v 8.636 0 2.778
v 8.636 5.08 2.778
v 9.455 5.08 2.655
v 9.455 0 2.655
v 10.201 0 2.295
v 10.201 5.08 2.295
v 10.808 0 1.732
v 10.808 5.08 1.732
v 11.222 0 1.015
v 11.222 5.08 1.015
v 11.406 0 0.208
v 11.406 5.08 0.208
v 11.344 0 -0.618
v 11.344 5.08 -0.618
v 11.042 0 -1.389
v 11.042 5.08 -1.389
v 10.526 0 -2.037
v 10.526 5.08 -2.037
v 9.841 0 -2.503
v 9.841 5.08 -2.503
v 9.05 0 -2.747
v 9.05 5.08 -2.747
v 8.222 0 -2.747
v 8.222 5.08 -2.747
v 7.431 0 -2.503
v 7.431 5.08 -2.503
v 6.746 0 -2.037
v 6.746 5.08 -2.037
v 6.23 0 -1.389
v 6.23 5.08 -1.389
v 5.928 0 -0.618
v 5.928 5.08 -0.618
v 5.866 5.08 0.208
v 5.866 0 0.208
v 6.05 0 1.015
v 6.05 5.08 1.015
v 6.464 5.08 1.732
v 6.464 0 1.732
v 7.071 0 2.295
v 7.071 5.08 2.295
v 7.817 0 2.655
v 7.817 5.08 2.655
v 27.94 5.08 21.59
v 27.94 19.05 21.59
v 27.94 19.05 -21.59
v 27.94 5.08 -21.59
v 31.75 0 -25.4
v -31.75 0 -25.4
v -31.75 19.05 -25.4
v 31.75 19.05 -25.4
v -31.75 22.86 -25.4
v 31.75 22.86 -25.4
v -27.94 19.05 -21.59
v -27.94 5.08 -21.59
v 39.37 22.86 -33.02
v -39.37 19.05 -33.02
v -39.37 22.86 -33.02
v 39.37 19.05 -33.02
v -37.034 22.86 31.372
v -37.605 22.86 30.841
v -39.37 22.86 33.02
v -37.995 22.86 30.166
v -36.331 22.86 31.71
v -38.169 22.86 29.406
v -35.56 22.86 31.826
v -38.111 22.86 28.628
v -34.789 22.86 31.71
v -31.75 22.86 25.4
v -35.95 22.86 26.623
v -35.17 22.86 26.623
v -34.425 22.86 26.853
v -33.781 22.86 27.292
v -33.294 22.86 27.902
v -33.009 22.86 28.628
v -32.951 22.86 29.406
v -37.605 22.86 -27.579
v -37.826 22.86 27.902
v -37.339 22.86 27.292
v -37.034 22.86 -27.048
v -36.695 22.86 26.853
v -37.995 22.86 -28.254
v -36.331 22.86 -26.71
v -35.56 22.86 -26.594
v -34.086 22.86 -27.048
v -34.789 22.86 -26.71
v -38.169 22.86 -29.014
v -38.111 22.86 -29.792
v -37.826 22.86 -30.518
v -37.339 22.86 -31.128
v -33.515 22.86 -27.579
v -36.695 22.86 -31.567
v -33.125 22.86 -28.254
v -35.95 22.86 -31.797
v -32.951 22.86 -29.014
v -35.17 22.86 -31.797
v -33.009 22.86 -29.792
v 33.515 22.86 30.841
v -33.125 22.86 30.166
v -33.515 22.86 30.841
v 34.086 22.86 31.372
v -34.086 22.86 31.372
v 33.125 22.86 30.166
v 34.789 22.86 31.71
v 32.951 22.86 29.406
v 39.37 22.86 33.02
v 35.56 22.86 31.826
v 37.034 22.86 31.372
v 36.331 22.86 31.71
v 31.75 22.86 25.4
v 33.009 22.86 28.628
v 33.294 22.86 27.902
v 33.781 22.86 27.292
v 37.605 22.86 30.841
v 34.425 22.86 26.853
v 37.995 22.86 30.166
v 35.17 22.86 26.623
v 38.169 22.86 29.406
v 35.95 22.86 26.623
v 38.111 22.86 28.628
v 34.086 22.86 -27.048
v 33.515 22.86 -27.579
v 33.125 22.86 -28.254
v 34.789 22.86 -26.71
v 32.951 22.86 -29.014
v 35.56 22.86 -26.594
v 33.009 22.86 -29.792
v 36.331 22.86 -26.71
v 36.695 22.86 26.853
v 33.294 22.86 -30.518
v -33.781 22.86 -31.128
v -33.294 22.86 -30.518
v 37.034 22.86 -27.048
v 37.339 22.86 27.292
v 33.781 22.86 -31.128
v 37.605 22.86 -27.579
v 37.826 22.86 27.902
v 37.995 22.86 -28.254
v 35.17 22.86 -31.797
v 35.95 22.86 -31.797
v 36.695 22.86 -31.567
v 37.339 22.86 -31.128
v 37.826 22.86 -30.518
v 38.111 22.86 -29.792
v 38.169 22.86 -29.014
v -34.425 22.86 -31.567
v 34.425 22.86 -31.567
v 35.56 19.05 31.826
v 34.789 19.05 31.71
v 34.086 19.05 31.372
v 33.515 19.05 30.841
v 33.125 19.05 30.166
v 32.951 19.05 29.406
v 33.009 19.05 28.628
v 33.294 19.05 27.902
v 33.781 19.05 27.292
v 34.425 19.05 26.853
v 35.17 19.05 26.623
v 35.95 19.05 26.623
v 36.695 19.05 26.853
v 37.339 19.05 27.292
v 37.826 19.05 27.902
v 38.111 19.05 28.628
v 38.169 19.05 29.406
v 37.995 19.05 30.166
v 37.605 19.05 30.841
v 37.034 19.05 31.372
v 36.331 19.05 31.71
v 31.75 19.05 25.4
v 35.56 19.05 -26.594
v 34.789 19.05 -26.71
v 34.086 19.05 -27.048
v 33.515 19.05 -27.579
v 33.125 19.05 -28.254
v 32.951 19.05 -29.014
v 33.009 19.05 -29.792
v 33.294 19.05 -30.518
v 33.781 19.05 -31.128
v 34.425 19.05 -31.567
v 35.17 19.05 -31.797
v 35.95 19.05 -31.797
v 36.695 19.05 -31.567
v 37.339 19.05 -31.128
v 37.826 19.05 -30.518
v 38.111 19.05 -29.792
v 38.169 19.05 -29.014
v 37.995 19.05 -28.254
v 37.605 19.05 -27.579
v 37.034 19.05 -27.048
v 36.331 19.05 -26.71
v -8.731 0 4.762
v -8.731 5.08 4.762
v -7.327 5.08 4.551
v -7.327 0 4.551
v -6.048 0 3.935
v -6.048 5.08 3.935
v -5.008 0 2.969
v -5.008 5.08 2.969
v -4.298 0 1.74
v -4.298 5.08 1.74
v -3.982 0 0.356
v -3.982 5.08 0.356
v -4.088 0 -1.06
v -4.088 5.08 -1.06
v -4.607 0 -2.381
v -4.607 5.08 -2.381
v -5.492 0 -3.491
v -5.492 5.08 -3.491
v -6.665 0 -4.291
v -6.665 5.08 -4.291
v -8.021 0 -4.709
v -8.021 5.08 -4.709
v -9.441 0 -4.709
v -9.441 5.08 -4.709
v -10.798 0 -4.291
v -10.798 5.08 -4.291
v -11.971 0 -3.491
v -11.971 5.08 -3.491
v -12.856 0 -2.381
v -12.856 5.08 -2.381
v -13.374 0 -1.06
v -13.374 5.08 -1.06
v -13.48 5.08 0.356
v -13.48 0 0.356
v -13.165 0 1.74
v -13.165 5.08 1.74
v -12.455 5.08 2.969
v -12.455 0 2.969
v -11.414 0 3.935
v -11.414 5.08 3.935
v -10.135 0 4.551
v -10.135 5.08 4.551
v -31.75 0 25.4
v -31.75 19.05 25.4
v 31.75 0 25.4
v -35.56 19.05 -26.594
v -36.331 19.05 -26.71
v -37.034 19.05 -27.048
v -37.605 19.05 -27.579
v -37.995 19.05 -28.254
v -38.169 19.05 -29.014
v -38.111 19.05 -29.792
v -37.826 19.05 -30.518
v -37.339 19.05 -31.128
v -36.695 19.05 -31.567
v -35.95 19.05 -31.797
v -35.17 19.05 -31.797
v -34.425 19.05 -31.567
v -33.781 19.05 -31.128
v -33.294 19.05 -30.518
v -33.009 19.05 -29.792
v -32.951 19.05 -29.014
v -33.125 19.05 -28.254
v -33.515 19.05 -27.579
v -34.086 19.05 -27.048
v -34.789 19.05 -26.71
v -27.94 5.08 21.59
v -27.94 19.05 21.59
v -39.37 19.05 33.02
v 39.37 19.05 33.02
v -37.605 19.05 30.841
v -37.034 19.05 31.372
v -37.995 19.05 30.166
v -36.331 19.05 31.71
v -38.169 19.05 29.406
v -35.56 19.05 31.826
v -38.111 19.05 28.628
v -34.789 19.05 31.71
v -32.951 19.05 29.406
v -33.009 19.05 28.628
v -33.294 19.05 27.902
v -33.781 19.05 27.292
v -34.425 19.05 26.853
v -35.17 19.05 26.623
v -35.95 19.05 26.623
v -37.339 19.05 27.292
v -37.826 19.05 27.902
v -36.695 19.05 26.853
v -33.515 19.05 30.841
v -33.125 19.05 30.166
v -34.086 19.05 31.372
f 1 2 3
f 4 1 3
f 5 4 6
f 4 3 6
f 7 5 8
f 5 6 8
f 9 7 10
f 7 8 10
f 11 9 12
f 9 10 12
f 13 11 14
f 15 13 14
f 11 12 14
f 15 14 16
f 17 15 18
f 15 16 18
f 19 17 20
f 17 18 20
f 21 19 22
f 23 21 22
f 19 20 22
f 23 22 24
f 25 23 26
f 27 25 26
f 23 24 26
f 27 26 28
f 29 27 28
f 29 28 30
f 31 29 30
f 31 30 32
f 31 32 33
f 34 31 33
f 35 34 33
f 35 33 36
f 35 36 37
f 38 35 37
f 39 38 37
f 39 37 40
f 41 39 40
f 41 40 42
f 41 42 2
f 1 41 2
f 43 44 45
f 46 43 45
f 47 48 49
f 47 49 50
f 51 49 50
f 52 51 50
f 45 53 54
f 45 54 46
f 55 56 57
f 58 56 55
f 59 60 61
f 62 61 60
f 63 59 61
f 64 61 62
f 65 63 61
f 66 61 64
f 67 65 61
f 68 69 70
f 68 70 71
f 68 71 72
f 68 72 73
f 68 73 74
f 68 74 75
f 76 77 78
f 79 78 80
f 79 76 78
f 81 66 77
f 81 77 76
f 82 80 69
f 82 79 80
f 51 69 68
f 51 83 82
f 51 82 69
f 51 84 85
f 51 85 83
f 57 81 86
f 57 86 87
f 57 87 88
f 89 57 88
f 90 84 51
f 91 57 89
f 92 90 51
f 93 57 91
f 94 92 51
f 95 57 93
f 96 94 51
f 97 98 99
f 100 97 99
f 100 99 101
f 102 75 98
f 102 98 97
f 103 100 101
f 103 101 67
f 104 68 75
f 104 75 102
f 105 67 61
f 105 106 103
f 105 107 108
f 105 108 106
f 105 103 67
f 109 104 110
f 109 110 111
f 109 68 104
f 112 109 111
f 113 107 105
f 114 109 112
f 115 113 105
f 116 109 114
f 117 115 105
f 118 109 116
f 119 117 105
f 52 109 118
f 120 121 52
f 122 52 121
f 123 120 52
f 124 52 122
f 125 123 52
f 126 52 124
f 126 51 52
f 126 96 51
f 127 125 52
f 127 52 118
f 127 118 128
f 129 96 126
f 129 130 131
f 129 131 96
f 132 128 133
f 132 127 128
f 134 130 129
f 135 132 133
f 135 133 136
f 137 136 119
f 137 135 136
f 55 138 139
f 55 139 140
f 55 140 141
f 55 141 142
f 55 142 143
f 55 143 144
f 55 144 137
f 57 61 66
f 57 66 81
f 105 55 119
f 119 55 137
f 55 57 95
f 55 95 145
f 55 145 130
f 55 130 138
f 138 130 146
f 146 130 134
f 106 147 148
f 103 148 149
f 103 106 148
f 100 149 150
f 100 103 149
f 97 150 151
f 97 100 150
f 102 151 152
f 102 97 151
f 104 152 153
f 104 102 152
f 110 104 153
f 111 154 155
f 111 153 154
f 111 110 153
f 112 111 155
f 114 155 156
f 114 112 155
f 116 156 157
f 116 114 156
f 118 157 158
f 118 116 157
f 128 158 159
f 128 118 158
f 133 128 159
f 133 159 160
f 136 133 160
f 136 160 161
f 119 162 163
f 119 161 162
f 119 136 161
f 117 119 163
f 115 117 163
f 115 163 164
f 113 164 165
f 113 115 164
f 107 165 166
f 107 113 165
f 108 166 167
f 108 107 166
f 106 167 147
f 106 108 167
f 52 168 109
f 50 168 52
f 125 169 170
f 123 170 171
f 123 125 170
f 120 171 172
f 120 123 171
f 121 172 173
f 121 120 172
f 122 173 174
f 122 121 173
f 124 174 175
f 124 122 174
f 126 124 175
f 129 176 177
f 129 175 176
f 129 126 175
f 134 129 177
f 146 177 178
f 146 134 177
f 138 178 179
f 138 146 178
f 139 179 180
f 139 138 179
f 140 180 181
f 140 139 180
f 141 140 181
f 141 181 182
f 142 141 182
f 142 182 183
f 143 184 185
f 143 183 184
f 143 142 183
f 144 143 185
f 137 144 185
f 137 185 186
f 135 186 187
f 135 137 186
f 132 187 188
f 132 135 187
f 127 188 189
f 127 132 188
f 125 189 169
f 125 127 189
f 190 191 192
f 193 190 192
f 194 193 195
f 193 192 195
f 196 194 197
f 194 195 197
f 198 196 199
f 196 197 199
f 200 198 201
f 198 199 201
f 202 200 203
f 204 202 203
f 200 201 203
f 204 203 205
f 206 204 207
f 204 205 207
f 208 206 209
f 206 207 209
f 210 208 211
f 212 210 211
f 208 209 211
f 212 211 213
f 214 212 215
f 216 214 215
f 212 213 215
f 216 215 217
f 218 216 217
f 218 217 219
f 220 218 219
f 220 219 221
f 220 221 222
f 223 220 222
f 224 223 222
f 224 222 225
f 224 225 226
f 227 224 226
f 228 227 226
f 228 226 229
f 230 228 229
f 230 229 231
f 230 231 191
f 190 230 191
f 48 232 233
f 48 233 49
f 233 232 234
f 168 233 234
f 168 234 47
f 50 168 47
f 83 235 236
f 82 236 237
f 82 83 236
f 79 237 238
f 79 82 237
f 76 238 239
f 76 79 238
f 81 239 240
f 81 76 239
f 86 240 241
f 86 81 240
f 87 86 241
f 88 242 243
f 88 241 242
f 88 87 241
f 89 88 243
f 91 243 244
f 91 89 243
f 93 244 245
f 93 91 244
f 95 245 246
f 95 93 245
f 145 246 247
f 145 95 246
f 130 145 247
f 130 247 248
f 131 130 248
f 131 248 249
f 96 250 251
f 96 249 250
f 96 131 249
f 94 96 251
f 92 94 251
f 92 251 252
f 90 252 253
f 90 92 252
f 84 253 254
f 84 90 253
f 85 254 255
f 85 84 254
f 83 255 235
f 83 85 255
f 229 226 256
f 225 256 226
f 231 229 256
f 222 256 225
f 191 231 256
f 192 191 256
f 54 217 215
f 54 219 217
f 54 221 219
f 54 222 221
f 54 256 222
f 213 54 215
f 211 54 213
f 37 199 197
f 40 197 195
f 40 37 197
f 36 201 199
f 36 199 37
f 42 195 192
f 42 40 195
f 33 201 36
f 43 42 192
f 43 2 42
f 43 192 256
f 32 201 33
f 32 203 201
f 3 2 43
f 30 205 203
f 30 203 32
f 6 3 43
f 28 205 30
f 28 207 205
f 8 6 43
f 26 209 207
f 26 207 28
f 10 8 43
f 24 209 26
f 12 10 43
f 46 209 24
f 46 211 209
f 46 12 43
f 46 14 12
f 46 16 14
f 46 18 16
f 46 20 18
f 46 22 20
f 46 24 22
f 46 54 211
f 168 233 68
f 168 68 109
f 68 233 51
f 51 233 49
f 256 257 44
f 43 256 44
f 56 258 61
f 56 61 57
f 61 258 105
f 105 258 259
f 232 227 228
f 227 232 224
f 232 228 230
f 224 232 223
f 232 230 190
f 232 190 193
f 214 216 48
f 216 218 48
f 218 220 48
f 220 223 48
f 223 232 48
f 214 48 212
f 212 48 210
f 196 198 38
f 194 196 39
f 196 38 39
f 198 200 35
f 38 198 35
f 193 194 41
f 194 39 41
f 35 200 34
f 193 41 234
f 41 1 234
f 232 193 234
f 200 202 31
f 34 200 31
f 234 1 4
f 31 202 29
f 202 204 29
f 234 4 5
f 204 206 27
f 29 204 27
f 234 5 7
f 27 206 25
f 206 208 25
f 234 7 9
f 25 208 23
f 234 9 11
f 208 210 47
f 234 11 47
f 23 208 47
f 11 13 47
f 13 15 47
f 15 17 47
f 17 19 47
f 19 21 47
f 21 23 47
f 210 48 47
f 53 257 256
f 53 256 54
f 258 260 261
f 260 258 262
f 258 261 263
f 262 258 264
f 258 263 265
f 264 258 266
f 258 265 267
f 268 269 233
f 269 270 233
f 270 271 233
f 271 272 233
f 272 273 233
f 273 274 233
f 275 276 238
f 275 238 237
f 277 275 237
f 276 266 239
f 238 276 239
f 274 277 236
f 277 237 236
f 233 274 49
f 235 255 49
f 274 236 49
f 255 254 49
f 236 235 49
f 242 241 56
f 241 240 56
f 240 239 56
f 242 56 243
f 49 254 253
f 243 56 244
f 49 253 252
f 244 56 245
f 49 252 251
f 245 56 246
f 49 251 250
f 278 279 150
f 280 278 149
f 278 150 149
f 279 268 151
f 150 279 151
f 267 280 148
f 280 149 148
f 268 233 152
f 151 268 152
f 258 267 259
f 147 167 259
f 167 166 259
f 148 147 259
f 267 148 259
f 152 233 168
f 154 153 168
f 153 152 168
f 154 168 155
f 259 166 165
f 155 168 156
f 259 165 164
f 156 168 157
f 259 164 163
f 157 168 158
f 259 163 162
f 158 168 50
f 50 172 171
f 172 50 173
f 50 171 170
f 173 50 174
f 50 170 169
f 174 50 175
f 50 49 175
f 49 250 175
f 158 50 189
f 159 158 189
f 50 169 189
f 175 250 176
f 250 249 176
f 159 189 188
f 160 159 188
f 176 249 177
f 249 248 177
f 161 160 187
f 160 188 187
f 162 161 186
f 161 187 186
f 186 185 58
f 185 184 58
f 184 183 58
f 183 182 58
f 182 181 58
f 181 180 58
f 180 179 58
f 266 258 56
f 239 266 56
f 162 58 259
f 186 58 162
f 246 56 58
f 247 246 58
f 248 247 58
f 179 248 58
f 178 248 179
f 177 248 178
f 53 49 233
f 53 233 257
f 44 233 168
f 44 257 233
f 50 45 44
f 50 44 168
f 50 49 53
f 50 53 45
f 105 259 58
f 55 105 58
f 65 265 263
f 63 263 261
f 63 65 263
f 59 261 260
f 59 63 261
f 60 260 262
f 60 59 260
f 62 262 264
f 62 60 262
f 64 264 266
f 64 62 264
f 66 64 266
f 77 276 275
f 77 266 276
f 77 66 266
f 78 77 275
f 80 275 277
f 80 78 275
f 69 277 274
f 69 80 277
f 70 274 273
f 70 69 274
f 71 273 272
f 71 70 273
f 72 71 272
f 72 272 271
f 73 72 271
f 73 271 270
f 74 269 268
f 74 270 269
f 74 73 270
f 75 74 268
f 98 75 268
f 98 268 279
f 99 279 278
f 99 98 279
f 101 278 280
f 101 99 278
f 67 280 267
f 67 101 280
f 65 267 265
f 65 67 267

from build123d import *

# Parameters (mm, degrees)
SKETCH1_W                       = 63.5
SKETCH1_H                       = 50.8
BOSS_EXTRUDE1_DEPTH             = 19.05
SKETCH2_W                       = 55.88
SKETCH2_H                       = 43.18
CUT_EXTRUDE1_DEPTH              = 13.97
SKETCH3_R                       = 4.7625
SKETCH3_R_2                     = 2.778125
CUT_EXTRUDE2_DEPTH              = 13.97
SKETCH19_W                      = 78.74
SKETCH19_H                      = 66.04
SKETCH19_W_2                    = 63.5
SKETCH19_H_2                    = 50.8
BOSS_EXTRUDE5_DEPTH             = 3.81
F_10_CLEARANCE_HOLE1_AT_2_COUNT = 2
F_10_CLEARANCE_HOLE1_AT_2_PITCH = 58.42
F_10_CLEARANCE_HOLE1_AT_3_COUNT = 2
F_10_CLEARANCE_HOLE1_AT_3_PITCH = 92.037768335
F_10_CLEARANCE_HOLE1_AT_4_COUNT = 2
F_10_CLEARANCE_HOLE1_AT_4_PITCH = 71.12


with BuildPart() as part:
    # Sketch1 → Boss-Extrude1 (new body)
    with BuildSketch(Plane(origin=(0, 0, 0), x_dir=(1, 0, 0), z_dir=(0, 1, 0))):
        Rectangle(SKETCH1_W, SKETCH1_H)
    extrude(amount=BOSS_EXTRUDE1_DEPTH)

    # Sketch2 → Cut-Extrude1 (cut)
    with BuildSketch(Plane(origin=(0, 19.05, 0), x_dir=(1, 0, 0), z_dir=(0, 1, 0))):
        Rectangle(SKETCH2_W, SKETCH2_H)
    extrude(amount=-CUT_EXTRUDE1_DEPTH, mode=Mode.SUBTRACT)

    # Sketch3 → Cut-Extrude2 (cut)
    with BuildSketch(Plane(origin=(0, 5.08, 0), x_dir=(1, 0, 0), z_dir=(0, 1, 0))):
        with Locations(Location((-8.73125, 0, 0), (0, 0, 270))):
            Circle(SKETCH3_R)
        with Locations(Location((8.636, 0, 0), (0, 0, 270))):
            Circle(SKETCH3_R_2)
    extrude(amount=-CUT_EXTRUDE2_DEPTH, mode=Mode.SUBTRACT)


with BuildPart() as body_2:
    # Sketch19 → Boss-Extrude5 (new body)
    with BuildSketch(Plane(origin=(0, 19.05, 0), x_dir=(1, 0, 0), z_dir=(0, 1, 0))):
        Rectangle(SKETCH19_W, SKETCH19_H)
        Rectangle(SKETCH19_W_2, SKETCH19_H_2, mode=Mode.SUBTRACT)
    extrude(amount=BOSS_EXTRUDE5_DEPTH)

    # Sketch21 → #10 Clearance Hole1 (revolve, cut)
    with BuildSketch(Plane(origin=(35.56, 22.86, -29.21), x_dir=(0, 0, 1), z_dir=(1, 0, 0))):
        Polygon((0, 0), (0, 24.431971551), (2.6162, 22.86), (2.6162, 0), align=None)
    f_10_clearance_hole1 = revolve(axis=Axis((35.56, 29.21, -29.21), (0, -1, 0)), mode=Mode.SUBTRACT)

    # #10 Clearance Hole1 at 2: #10 Clearance Hole1 ×2
    with Locations(*[(0, 0, i * F_10_CLEARANCE_HOLE1_AT_2_PITCH) for i in range(1, F_10_CLEARANCE_HOLE1_AT_2_COUNT)]):
        add(f_10_clearance_hole1, mode=Mode.SUBTRACT)

    # #10 Clearance Hole1 at 3: #10 Clearance Hole1 ×2
    with Locations(*[Vector(-0.7727262545252344, 0, 0.6347394233600139) * (i * F_10_CLEARANCE_HOLE1_AT_3_PITCH) for i in range(1, F_10_CLEARANCE_HOLE1_AT_3_COUNT)]):
        add(f_10_clearance_hole1, mode=Mode.SUBTRACT)

    # #10 Clearance Hole1 at 4: #10 Clearance Hole1 ×2
    with Locations(*[(-i * F_10_CLEARANCE_HOLE1_AT_4_PITCH, 0, 0) for i in range(1, F_10_CLEARANCE_HOLE1_AT_4_COUNT)]):
        add(f_10_clearance_hole1, mode=Mode.SUBTRACT)


solid = Compound([part.part, body_2.part])
